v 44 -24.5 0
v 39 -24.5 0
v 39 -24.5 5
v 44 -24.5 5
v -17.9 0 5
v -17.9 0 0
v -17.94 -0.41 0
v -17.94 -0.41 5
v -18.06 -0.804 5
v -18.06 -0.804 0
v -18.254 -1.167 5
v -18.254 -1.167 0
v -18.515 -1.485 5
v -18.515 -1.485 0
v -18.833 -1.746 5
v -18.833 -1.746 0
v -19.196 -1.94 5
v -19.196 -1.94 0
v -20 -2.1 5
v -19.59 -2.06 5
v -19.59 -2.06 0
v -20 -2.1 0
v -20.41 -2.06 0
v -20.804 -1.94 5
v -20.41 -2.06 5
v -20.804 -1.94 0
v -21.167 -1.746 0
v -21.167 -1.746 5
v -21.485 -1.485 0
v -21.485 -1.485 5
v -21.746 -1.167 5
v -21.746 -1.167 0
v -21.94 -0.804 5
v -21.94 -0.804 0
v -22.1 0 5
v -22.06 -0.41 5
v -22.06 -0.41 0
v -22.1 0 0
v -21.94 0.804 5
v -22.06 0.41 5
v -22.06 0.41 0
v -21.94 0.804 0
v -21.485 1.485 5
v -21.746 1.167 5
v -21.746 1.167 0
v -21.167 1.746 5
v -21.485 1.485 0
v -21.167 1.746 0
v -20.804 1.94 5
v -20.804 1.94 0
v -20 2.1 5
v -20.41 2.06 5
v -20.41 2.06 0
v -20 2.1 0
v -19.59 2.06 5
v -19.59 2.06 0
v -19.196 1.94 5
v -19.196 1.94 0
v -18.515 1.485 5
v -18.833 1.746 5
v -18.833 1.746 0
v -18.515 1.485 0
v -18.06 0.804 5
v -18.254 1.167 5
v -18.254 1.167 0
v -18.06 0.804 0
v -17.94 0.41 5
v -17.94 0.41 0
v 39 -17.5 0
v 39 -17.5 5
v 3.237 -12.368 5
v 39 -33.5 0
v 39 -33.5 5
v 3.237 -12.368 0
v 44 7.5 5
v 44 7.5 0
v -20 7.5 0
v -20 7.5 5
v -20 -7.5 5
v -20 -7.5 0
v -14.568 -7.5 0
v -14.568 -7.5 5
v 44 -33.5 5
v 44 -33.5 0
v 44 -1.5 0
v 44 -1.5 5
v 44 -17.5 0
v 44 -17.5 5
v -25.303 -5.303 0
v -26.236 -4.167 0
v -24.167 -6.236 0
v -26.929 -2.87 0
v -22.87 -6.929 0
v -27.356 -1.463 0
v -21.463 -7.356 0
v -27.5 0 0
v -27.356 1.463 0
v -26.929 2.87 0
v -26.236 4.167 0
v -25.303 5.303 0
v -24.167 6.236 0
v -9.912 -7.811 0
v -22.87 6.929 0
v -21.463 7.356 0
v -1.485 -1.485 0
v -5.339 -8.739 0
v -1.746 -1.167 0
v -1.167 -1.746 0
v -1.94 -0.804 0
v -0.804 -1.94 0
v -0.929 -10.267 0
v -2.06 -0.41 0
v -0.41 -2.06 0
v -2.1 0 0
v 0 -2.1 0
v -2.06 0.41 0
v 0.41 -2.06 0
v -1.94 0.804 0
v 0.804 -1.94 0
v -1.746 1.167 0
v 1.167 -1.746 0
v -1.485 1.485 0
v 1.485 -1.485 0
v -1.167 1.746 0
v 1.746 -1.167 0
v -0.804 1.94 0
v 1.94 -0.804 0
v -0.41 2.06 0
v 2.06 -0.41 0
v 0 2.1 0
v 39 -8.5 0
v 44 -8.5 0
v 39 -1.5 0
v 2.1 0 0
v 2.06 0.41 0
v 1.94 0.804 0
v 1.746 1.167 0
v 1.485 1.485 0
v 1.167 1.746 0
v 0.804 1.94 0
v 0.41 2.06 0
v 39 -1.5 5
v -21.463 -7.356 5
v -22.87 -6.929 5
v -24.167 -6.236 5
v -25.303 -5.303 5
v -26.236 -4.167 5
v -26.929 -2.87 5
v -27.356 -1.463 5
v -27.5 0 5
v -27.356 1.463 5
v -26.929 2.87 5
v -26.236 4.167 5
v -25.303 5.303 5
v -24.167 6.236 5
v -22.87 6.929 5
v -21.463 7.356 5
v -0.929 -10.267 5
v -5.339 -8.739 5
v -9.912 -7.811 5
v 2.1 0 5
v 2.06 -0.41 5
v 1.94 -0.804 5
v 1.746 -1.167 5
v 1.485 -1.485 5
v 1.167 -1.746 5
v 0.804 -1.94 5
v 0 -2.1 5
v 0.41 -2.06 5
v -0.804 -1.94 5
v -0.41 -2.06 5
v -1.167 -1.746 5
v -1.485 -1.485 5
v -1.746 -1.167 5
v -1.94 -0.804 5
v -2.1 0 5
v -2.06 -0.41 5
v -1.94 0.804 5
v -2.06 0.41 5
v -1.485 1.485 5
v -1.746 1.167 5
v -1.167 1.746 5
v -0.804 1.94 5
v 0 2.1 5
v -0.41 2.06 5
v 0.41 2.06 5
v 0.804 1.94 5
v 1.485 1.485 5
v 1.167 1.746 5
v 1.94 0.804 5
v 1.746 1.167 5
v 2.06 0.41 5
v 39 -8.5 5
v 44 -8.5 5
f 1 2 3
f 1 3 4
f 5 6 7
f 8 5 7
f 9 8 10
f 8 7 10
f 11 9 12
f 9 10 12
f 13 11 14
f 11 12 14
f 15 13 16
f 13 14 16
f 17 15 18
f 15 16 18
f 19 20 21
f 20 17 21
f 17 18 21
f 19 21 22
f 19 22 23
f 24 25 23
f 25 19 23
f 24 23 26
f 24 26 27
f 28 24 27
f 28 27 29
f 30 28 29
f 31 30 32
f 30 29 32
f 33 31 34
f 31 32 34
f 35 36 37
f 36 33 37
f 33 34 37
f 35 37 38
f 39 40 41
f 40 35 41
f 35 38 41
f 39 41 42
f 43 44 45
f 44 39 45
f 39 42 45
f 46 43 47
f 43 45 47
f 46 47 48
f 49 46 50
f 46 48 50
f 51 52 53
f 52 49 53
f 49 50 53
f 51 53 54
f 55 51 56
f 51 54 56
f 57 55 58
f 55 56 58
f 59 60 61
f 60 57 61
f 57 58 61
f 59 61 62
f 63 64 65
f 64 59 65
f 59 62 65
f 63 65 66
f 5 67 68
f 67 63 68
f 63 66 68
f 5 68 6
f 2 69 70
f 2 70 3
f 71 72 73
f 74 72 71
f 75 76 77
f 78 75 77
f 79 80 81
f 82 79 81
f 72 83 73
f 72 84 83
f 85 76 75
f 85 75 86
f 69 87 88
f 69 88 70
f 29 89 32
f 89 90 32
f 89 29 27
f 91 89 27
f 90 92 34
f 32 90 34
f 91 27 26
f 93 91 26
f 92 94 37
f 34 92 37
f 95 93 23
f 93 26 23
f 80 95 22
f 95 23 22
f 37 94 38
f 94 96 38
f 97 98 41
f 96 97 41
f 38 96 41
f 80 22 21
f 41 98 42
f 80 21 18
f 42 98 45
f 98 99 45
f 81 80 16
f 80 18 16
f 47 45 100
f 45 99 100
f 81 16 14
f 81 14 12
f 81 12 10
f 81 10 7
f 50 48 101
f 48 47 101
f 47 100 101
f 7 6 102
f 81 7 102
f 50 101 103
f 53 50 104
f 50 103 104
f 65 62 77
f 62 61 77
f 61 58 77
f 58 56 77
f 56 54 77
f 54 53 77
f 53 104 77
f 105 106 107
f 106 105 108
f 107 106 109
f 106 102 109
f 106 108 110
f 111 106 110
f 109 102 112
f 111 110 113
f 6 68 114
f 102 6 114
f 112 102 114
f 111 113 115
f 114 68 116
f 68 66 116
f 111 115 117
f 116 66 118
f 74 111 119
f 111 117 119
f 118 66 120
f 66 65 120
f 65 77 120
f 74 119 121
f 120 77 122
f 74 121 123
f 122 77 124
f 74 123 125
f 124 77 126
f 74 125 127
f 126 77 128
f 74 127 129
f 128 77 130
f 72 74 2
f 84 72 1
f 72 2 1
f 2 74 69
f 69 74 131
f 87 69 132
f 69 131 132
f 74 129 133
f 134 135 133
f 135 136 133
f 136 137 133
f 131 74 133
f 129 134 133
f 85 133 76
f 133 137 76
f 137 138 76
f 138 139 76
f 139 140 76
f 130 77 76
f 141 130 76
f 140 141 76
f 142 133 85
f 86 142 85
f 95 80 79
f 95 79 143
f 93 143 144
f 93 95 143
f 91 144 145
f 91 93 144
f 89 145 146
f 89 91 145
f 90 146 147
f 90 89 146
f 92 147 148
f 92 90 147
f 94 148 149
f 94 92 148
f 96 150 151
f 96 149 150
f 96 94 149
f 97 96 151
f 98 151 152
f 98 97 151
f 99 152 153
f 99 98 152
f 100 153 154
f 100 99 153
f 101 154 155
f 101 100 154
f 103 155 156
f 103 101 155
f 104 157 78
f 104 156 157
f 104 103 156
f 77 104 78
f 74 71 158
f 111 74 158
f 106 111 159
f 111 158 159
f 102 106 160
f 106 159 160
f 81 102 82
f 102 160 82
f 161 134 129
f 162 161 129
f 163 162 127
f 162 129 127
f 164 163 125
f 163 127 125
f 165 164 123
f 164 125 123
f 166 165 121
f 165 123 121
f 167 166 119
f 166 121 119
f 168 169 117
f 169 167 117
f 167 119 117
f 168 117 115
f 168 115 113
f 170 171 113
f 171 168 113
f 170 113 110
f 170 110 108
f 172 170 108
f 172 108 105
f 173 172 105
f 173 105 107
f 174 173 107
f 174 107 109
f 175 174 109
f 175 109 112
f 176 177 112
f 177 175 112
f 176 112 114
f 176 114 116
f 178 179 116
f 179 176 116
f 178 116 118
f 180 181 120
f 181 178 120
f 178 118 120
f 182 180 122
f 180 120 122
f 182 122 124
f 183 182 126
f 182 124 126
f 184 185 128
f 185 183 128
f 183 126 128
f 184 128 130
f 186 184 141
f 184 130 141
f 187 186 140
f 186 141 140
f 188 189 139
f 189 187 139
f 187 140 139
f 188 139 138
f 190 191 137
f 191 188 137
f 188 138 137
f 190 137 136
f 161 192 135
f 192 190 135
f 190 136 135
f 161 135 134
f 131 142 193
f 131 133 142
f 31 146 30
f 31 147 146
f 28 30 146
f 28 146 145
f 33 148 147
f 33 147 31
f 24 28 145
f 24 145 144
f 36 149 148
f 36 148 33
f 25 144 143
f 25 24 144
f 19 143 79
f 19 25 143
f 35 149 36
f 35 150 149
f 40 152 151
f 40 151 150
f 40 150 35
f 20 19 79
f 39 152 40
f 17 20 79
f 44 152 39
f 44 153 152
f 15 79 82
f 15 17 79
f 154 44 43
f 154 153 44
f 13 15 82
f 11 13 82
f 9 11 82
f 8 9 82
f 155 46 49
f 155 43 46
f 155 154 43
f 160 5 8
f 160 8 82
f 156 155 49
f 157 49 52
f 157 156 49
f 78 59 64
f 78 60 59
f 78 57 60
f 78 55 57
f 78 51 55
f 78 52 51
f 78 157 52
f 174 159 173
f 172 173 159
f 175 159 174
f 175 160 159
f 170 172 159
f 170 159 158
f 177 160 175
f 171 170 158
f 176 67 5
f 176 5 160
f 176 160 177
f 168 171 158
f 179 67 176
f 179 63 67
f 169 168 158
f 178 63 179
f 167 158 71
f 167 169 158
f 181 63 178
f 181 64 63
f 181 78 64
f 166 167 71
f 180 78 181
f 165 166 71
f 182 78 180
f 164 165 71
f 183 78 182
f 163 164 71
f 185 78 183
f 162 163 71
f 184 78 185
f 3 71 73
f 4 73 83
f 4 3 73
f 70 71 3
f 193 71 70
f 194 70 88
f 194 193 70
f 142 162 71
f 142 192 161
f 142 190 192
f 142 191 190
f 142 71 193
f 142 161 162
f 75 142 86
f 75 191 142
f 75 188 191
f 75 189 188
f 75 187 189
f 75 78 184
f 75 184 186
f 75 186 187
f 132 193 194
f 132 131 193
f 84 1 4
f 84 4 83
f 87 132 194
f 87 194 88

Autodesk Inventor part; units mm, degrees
ref_plane "YZ Plane" through (0, 0, 0) normal (1, 0, 0) x (0, 1, 0)
ref_plane "XZ Plane" through (0, 0, 0) normal (0, 1, 0) x (-1, 0, 0)
ref_plane "XY Plane" through (0, 0, 0) normal (0, 0, 1) x (1, 0, 0)
sketch "Sketch1" plane through (0, 0, 0) normal (0, 0, 1) x (1, 0, 0)
  line L0 (-20, -7.5) -> (-5, -7.5)
  line L1 (44, 7.5) -> (-20, 7.5)
  arc A0 (-20, 7.5) -> (-20, -7.5) centre (-20, 0) ccw
  circle A1 centre (-20, 0) radius 2.1
  line L2 (44, 7.5) -> (44, -1.5)
  line L3 (39, -1.5) -> (39, -8.5)
  line L4 (39, -8.5) -> (44, -8.5)
  line L5 (44, -8.5) -> (44, -17.5)
  line L6 (44, -17.5) -> (39, -17.5)
  line L7 (39, -1.5) -> (44, -1.5)
  circle A2 centre (0, 0) radius 2.1
  line L8 (39, -17.5) -> (39, -24.5)
  line L9 (39, -24.5) -> (44, -24.5)
  line L10 (44, -24.5) -> (44, -33.5)
  line L11 (44, -33.5) -> (39, -33.5)
  line L12 (39, -33.5) -> (-5, -7.5)
  dimension "d1" = 4.2
  dimension "d8" = 15
  dimension "d9" = 5
  dimension "d10" = 7
  dimension "d11" = 9
  dimension "d12" = 9
  dimension "d14" = 4.2
  dimension "d15" = 20
  dimension "d16" = 64
  dimension "d17" = 15
  dimension "d18" = 7
  dimension "d19" = 9
extrude "Extrusion1" add sketch "Sketch1" along normal blind 5
fillet "Fillet1" radius 35 1 edges at (-5, -7.5, 2.5)
equation "\"d1\" = d14"
equation "\"d12\" = d11"
equation "\"d18\" = d10"
equation "\"d19\" = d12"
properties part number "gate-upper-link"
